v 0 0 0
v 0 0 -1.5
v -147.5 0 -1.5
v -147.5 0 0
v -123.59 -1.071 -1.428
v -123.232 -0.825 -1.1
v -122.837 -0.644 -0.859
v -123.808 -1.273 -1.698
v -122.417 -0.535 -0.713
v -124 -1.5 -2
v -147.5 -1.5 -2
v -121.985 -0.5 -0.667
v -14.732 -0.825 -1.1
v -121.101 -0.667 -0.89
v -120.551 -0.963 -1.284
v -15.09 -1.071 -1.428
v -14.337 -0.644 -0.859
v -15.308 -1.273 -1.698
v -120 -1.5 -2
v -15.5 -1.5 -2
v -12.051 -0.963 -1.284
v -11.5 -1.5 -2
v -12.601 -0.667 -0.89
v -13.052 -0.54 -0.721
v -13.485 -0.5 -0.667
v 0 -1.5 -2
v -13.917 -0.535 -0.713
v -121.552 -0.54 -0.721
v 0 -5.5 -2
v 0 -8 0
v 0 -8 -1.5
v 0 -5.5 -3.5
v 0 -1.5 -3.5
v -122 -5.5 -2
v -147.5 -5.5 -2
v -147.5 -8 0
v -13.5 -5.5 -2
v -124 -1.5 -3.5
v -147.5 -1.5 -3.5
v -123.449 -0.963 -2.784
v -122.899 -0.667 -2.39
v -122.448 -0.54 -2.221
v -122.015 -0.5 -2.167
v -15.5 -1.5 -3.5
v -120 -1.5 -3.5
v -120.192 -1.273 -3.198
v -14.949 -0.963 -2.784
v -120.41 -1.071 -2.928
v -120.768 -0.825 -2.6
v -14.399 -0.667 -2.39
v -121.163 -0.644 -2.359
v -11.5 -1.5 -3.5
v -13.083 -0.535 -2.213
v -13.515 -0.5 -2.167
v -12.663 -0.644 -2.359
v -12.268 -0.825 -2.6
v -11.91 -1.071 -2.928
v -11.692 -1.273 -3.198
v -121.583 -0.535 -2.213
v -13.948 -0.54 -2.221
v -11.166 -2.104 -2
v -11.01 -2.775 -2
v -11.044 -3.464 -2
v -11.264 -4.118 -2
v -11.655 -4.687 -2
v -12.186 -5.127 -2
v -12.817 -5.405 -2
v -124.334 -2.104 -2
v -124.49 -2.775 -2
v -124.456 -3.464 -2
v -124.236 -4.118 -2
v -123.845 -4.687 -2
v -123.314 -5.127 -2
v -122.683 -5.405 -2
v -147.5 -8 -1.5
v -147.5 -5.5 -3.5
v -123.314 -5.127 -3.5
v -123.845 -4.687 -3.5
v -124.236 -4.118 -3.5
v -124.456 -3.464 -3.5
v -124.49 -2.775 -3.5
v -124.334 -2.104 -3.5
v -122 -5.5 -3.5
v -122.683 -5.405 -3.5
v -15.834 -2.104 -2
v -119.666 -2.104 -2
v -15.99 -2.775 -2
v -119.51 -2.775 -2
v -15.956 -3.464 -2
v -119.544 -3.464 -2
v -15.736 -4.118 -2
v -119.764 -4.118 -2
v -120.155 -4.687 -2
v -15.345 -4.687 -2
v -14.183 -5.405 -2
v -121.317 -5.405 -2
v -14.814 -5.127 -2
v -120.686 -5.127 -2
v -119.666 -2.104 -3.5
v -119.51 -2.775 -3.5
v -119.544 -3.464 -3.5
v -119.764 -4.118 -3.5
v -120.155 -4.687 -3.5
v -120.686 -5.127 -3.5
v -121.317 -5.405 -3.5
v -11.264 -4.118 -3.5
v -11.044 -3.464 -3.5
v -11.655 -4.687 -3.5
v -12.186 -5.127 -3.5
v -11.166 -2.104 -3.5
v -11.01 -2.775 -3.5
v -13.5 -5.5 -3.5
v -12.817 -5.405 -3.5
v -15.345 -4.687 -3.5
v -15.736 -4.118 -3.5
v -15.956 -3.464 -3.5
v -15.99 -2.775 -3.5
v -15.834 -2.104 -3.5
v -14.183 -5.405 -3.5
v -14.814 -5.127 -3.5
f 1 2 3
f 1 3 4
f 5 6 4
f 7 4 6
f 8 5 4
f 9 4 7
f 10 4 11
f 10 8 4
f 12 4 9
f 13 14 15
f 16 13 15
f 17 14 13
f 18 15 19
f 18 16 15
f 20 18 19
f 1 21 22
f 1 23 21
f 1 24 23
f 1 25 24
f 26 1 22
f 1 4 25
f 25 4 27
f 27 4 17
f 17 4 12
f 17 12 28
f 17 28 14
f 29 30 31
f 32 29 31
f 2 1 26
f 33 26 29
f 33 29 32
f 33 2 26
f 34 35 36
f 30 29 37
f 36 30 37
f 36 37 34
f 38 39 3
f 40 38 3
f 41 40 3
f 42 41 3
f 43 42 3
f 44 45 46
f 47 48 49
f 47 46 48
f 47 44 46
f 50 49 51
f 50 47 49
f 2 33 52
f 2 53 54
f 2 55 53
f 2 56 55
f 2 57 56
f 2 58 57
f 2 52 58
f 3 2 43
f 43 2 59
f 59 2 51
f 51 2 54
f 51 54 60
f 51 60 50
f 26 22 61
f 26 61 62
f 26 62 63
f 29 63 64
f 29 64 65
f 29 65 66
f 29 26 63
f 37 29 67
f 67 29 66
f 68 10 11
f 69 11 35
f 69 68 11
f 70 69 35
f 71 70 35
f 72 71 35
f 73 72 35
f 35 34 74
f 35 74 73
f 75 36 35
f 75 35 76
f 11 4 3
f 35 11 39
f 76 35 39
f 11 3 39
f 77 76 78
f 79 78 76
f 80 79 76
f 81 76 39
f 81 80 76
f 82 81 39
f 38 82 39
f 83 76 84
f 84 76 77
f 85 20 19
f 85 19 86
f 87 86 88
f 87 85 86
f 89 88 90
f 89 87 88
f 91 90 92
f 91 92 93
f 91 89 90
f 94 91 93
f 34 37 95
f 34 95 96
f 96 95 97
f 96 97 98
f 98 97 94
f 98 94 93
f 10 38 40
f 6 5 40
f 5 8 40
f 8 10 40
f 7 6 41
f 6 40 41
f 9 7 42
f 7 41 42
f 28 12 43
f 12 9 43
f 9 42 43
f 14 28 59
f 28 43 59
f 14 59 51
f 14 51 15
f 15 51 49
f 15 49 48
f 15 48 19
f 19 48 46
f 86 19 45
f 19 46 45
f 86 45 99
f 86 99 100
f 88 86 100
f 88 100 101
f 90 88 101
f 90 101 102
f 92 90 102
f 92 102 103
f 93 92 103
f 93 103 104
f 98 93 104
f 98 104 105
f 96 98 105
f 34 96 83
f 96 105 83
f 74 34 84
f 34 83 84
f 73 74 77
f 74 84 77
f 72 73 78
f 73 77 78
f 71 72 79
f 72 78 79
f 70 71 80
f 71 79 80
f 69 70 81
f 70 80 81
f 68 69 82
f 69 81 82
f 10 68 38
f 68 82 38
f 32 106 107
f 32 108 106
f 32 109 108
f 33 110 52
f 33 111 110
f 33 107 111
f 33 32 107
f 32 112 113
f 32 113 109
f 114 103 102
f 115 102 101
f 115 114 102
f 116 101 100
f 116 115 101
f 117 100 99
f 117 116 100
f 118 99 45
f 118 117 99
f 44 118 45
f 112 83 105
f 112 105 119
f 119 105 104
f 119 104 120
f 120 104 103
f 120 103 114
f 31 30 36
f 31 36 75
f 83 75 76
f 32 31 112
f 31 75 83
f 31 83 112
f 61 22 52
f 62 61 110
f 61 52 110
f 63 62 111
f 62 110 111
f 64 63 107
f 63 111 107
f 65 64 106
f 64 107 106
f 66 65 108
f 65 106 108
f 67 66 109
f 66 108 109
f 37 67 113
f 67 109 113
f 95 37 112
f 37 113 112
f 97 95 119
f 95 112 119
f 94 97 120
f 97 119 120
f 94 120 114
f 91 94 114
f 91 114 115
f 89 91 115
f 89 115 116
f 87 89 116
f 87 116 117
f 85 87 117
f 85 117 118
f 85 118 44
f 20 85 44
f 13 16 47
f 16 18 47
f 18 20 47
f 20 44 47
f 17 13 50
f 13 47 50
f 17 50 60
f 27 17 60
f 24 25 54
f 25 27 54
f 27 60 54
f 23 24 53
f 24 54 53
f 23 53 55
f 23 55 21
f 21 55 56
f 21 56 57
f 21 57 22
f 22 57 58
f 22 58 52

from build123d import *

# Parameters (mm, degrees)
MAIN_BODY_EXTRUDE_DEPTH       = 147.5
CROSS_BOLT_BORE_SKETCH_R      = 2.5
CROSS_BOLT_BORE_EXTRUDE_DEPTH = 148.758248501


with BuildPart() as part:
    # Main Body Sketch → Main Body Extrude (new body)
    with BuildSketch(Plane(origin=(0, 0, 0), x_dir=(0, 0, -1), z_dir=(1, 0, 0))):
        Polygon((0, 0), (2, -1.5), (2, -5.5), (0, -8), (1.5, -8), (3.5, -5.5), (3.5, -1.5), (1.5, 0), align=None)
    extrude(amount=-MAIN_BODY_EXTRUDE_DEPTH)

    # Cross Bolt Bore Sketch → Cross Bolt Bore Extrude (cut, through all)
    with BuildSketch(Plane(origin=(0, 0, -3.5), x_dir=(-1, 0, 0), z_dir=(0, 0, -1))):
        with Locations(Location((13.5, -3, 0), (0, 0, 143.130102354))):
            Circle(CROSS_BOLT_BORE_SKETCH_R)
        with Locations(Location((122, -3, 0), (0, 0, 36.869897646))):
            Circle(CROSS_BOLT_BORE_SKETCH_R)
    extrude(amount=-CROSS_BOLT_BORE_EXTRUDE_DEPTH, mode=Mode.SUBTRACT)


solid = part.part
